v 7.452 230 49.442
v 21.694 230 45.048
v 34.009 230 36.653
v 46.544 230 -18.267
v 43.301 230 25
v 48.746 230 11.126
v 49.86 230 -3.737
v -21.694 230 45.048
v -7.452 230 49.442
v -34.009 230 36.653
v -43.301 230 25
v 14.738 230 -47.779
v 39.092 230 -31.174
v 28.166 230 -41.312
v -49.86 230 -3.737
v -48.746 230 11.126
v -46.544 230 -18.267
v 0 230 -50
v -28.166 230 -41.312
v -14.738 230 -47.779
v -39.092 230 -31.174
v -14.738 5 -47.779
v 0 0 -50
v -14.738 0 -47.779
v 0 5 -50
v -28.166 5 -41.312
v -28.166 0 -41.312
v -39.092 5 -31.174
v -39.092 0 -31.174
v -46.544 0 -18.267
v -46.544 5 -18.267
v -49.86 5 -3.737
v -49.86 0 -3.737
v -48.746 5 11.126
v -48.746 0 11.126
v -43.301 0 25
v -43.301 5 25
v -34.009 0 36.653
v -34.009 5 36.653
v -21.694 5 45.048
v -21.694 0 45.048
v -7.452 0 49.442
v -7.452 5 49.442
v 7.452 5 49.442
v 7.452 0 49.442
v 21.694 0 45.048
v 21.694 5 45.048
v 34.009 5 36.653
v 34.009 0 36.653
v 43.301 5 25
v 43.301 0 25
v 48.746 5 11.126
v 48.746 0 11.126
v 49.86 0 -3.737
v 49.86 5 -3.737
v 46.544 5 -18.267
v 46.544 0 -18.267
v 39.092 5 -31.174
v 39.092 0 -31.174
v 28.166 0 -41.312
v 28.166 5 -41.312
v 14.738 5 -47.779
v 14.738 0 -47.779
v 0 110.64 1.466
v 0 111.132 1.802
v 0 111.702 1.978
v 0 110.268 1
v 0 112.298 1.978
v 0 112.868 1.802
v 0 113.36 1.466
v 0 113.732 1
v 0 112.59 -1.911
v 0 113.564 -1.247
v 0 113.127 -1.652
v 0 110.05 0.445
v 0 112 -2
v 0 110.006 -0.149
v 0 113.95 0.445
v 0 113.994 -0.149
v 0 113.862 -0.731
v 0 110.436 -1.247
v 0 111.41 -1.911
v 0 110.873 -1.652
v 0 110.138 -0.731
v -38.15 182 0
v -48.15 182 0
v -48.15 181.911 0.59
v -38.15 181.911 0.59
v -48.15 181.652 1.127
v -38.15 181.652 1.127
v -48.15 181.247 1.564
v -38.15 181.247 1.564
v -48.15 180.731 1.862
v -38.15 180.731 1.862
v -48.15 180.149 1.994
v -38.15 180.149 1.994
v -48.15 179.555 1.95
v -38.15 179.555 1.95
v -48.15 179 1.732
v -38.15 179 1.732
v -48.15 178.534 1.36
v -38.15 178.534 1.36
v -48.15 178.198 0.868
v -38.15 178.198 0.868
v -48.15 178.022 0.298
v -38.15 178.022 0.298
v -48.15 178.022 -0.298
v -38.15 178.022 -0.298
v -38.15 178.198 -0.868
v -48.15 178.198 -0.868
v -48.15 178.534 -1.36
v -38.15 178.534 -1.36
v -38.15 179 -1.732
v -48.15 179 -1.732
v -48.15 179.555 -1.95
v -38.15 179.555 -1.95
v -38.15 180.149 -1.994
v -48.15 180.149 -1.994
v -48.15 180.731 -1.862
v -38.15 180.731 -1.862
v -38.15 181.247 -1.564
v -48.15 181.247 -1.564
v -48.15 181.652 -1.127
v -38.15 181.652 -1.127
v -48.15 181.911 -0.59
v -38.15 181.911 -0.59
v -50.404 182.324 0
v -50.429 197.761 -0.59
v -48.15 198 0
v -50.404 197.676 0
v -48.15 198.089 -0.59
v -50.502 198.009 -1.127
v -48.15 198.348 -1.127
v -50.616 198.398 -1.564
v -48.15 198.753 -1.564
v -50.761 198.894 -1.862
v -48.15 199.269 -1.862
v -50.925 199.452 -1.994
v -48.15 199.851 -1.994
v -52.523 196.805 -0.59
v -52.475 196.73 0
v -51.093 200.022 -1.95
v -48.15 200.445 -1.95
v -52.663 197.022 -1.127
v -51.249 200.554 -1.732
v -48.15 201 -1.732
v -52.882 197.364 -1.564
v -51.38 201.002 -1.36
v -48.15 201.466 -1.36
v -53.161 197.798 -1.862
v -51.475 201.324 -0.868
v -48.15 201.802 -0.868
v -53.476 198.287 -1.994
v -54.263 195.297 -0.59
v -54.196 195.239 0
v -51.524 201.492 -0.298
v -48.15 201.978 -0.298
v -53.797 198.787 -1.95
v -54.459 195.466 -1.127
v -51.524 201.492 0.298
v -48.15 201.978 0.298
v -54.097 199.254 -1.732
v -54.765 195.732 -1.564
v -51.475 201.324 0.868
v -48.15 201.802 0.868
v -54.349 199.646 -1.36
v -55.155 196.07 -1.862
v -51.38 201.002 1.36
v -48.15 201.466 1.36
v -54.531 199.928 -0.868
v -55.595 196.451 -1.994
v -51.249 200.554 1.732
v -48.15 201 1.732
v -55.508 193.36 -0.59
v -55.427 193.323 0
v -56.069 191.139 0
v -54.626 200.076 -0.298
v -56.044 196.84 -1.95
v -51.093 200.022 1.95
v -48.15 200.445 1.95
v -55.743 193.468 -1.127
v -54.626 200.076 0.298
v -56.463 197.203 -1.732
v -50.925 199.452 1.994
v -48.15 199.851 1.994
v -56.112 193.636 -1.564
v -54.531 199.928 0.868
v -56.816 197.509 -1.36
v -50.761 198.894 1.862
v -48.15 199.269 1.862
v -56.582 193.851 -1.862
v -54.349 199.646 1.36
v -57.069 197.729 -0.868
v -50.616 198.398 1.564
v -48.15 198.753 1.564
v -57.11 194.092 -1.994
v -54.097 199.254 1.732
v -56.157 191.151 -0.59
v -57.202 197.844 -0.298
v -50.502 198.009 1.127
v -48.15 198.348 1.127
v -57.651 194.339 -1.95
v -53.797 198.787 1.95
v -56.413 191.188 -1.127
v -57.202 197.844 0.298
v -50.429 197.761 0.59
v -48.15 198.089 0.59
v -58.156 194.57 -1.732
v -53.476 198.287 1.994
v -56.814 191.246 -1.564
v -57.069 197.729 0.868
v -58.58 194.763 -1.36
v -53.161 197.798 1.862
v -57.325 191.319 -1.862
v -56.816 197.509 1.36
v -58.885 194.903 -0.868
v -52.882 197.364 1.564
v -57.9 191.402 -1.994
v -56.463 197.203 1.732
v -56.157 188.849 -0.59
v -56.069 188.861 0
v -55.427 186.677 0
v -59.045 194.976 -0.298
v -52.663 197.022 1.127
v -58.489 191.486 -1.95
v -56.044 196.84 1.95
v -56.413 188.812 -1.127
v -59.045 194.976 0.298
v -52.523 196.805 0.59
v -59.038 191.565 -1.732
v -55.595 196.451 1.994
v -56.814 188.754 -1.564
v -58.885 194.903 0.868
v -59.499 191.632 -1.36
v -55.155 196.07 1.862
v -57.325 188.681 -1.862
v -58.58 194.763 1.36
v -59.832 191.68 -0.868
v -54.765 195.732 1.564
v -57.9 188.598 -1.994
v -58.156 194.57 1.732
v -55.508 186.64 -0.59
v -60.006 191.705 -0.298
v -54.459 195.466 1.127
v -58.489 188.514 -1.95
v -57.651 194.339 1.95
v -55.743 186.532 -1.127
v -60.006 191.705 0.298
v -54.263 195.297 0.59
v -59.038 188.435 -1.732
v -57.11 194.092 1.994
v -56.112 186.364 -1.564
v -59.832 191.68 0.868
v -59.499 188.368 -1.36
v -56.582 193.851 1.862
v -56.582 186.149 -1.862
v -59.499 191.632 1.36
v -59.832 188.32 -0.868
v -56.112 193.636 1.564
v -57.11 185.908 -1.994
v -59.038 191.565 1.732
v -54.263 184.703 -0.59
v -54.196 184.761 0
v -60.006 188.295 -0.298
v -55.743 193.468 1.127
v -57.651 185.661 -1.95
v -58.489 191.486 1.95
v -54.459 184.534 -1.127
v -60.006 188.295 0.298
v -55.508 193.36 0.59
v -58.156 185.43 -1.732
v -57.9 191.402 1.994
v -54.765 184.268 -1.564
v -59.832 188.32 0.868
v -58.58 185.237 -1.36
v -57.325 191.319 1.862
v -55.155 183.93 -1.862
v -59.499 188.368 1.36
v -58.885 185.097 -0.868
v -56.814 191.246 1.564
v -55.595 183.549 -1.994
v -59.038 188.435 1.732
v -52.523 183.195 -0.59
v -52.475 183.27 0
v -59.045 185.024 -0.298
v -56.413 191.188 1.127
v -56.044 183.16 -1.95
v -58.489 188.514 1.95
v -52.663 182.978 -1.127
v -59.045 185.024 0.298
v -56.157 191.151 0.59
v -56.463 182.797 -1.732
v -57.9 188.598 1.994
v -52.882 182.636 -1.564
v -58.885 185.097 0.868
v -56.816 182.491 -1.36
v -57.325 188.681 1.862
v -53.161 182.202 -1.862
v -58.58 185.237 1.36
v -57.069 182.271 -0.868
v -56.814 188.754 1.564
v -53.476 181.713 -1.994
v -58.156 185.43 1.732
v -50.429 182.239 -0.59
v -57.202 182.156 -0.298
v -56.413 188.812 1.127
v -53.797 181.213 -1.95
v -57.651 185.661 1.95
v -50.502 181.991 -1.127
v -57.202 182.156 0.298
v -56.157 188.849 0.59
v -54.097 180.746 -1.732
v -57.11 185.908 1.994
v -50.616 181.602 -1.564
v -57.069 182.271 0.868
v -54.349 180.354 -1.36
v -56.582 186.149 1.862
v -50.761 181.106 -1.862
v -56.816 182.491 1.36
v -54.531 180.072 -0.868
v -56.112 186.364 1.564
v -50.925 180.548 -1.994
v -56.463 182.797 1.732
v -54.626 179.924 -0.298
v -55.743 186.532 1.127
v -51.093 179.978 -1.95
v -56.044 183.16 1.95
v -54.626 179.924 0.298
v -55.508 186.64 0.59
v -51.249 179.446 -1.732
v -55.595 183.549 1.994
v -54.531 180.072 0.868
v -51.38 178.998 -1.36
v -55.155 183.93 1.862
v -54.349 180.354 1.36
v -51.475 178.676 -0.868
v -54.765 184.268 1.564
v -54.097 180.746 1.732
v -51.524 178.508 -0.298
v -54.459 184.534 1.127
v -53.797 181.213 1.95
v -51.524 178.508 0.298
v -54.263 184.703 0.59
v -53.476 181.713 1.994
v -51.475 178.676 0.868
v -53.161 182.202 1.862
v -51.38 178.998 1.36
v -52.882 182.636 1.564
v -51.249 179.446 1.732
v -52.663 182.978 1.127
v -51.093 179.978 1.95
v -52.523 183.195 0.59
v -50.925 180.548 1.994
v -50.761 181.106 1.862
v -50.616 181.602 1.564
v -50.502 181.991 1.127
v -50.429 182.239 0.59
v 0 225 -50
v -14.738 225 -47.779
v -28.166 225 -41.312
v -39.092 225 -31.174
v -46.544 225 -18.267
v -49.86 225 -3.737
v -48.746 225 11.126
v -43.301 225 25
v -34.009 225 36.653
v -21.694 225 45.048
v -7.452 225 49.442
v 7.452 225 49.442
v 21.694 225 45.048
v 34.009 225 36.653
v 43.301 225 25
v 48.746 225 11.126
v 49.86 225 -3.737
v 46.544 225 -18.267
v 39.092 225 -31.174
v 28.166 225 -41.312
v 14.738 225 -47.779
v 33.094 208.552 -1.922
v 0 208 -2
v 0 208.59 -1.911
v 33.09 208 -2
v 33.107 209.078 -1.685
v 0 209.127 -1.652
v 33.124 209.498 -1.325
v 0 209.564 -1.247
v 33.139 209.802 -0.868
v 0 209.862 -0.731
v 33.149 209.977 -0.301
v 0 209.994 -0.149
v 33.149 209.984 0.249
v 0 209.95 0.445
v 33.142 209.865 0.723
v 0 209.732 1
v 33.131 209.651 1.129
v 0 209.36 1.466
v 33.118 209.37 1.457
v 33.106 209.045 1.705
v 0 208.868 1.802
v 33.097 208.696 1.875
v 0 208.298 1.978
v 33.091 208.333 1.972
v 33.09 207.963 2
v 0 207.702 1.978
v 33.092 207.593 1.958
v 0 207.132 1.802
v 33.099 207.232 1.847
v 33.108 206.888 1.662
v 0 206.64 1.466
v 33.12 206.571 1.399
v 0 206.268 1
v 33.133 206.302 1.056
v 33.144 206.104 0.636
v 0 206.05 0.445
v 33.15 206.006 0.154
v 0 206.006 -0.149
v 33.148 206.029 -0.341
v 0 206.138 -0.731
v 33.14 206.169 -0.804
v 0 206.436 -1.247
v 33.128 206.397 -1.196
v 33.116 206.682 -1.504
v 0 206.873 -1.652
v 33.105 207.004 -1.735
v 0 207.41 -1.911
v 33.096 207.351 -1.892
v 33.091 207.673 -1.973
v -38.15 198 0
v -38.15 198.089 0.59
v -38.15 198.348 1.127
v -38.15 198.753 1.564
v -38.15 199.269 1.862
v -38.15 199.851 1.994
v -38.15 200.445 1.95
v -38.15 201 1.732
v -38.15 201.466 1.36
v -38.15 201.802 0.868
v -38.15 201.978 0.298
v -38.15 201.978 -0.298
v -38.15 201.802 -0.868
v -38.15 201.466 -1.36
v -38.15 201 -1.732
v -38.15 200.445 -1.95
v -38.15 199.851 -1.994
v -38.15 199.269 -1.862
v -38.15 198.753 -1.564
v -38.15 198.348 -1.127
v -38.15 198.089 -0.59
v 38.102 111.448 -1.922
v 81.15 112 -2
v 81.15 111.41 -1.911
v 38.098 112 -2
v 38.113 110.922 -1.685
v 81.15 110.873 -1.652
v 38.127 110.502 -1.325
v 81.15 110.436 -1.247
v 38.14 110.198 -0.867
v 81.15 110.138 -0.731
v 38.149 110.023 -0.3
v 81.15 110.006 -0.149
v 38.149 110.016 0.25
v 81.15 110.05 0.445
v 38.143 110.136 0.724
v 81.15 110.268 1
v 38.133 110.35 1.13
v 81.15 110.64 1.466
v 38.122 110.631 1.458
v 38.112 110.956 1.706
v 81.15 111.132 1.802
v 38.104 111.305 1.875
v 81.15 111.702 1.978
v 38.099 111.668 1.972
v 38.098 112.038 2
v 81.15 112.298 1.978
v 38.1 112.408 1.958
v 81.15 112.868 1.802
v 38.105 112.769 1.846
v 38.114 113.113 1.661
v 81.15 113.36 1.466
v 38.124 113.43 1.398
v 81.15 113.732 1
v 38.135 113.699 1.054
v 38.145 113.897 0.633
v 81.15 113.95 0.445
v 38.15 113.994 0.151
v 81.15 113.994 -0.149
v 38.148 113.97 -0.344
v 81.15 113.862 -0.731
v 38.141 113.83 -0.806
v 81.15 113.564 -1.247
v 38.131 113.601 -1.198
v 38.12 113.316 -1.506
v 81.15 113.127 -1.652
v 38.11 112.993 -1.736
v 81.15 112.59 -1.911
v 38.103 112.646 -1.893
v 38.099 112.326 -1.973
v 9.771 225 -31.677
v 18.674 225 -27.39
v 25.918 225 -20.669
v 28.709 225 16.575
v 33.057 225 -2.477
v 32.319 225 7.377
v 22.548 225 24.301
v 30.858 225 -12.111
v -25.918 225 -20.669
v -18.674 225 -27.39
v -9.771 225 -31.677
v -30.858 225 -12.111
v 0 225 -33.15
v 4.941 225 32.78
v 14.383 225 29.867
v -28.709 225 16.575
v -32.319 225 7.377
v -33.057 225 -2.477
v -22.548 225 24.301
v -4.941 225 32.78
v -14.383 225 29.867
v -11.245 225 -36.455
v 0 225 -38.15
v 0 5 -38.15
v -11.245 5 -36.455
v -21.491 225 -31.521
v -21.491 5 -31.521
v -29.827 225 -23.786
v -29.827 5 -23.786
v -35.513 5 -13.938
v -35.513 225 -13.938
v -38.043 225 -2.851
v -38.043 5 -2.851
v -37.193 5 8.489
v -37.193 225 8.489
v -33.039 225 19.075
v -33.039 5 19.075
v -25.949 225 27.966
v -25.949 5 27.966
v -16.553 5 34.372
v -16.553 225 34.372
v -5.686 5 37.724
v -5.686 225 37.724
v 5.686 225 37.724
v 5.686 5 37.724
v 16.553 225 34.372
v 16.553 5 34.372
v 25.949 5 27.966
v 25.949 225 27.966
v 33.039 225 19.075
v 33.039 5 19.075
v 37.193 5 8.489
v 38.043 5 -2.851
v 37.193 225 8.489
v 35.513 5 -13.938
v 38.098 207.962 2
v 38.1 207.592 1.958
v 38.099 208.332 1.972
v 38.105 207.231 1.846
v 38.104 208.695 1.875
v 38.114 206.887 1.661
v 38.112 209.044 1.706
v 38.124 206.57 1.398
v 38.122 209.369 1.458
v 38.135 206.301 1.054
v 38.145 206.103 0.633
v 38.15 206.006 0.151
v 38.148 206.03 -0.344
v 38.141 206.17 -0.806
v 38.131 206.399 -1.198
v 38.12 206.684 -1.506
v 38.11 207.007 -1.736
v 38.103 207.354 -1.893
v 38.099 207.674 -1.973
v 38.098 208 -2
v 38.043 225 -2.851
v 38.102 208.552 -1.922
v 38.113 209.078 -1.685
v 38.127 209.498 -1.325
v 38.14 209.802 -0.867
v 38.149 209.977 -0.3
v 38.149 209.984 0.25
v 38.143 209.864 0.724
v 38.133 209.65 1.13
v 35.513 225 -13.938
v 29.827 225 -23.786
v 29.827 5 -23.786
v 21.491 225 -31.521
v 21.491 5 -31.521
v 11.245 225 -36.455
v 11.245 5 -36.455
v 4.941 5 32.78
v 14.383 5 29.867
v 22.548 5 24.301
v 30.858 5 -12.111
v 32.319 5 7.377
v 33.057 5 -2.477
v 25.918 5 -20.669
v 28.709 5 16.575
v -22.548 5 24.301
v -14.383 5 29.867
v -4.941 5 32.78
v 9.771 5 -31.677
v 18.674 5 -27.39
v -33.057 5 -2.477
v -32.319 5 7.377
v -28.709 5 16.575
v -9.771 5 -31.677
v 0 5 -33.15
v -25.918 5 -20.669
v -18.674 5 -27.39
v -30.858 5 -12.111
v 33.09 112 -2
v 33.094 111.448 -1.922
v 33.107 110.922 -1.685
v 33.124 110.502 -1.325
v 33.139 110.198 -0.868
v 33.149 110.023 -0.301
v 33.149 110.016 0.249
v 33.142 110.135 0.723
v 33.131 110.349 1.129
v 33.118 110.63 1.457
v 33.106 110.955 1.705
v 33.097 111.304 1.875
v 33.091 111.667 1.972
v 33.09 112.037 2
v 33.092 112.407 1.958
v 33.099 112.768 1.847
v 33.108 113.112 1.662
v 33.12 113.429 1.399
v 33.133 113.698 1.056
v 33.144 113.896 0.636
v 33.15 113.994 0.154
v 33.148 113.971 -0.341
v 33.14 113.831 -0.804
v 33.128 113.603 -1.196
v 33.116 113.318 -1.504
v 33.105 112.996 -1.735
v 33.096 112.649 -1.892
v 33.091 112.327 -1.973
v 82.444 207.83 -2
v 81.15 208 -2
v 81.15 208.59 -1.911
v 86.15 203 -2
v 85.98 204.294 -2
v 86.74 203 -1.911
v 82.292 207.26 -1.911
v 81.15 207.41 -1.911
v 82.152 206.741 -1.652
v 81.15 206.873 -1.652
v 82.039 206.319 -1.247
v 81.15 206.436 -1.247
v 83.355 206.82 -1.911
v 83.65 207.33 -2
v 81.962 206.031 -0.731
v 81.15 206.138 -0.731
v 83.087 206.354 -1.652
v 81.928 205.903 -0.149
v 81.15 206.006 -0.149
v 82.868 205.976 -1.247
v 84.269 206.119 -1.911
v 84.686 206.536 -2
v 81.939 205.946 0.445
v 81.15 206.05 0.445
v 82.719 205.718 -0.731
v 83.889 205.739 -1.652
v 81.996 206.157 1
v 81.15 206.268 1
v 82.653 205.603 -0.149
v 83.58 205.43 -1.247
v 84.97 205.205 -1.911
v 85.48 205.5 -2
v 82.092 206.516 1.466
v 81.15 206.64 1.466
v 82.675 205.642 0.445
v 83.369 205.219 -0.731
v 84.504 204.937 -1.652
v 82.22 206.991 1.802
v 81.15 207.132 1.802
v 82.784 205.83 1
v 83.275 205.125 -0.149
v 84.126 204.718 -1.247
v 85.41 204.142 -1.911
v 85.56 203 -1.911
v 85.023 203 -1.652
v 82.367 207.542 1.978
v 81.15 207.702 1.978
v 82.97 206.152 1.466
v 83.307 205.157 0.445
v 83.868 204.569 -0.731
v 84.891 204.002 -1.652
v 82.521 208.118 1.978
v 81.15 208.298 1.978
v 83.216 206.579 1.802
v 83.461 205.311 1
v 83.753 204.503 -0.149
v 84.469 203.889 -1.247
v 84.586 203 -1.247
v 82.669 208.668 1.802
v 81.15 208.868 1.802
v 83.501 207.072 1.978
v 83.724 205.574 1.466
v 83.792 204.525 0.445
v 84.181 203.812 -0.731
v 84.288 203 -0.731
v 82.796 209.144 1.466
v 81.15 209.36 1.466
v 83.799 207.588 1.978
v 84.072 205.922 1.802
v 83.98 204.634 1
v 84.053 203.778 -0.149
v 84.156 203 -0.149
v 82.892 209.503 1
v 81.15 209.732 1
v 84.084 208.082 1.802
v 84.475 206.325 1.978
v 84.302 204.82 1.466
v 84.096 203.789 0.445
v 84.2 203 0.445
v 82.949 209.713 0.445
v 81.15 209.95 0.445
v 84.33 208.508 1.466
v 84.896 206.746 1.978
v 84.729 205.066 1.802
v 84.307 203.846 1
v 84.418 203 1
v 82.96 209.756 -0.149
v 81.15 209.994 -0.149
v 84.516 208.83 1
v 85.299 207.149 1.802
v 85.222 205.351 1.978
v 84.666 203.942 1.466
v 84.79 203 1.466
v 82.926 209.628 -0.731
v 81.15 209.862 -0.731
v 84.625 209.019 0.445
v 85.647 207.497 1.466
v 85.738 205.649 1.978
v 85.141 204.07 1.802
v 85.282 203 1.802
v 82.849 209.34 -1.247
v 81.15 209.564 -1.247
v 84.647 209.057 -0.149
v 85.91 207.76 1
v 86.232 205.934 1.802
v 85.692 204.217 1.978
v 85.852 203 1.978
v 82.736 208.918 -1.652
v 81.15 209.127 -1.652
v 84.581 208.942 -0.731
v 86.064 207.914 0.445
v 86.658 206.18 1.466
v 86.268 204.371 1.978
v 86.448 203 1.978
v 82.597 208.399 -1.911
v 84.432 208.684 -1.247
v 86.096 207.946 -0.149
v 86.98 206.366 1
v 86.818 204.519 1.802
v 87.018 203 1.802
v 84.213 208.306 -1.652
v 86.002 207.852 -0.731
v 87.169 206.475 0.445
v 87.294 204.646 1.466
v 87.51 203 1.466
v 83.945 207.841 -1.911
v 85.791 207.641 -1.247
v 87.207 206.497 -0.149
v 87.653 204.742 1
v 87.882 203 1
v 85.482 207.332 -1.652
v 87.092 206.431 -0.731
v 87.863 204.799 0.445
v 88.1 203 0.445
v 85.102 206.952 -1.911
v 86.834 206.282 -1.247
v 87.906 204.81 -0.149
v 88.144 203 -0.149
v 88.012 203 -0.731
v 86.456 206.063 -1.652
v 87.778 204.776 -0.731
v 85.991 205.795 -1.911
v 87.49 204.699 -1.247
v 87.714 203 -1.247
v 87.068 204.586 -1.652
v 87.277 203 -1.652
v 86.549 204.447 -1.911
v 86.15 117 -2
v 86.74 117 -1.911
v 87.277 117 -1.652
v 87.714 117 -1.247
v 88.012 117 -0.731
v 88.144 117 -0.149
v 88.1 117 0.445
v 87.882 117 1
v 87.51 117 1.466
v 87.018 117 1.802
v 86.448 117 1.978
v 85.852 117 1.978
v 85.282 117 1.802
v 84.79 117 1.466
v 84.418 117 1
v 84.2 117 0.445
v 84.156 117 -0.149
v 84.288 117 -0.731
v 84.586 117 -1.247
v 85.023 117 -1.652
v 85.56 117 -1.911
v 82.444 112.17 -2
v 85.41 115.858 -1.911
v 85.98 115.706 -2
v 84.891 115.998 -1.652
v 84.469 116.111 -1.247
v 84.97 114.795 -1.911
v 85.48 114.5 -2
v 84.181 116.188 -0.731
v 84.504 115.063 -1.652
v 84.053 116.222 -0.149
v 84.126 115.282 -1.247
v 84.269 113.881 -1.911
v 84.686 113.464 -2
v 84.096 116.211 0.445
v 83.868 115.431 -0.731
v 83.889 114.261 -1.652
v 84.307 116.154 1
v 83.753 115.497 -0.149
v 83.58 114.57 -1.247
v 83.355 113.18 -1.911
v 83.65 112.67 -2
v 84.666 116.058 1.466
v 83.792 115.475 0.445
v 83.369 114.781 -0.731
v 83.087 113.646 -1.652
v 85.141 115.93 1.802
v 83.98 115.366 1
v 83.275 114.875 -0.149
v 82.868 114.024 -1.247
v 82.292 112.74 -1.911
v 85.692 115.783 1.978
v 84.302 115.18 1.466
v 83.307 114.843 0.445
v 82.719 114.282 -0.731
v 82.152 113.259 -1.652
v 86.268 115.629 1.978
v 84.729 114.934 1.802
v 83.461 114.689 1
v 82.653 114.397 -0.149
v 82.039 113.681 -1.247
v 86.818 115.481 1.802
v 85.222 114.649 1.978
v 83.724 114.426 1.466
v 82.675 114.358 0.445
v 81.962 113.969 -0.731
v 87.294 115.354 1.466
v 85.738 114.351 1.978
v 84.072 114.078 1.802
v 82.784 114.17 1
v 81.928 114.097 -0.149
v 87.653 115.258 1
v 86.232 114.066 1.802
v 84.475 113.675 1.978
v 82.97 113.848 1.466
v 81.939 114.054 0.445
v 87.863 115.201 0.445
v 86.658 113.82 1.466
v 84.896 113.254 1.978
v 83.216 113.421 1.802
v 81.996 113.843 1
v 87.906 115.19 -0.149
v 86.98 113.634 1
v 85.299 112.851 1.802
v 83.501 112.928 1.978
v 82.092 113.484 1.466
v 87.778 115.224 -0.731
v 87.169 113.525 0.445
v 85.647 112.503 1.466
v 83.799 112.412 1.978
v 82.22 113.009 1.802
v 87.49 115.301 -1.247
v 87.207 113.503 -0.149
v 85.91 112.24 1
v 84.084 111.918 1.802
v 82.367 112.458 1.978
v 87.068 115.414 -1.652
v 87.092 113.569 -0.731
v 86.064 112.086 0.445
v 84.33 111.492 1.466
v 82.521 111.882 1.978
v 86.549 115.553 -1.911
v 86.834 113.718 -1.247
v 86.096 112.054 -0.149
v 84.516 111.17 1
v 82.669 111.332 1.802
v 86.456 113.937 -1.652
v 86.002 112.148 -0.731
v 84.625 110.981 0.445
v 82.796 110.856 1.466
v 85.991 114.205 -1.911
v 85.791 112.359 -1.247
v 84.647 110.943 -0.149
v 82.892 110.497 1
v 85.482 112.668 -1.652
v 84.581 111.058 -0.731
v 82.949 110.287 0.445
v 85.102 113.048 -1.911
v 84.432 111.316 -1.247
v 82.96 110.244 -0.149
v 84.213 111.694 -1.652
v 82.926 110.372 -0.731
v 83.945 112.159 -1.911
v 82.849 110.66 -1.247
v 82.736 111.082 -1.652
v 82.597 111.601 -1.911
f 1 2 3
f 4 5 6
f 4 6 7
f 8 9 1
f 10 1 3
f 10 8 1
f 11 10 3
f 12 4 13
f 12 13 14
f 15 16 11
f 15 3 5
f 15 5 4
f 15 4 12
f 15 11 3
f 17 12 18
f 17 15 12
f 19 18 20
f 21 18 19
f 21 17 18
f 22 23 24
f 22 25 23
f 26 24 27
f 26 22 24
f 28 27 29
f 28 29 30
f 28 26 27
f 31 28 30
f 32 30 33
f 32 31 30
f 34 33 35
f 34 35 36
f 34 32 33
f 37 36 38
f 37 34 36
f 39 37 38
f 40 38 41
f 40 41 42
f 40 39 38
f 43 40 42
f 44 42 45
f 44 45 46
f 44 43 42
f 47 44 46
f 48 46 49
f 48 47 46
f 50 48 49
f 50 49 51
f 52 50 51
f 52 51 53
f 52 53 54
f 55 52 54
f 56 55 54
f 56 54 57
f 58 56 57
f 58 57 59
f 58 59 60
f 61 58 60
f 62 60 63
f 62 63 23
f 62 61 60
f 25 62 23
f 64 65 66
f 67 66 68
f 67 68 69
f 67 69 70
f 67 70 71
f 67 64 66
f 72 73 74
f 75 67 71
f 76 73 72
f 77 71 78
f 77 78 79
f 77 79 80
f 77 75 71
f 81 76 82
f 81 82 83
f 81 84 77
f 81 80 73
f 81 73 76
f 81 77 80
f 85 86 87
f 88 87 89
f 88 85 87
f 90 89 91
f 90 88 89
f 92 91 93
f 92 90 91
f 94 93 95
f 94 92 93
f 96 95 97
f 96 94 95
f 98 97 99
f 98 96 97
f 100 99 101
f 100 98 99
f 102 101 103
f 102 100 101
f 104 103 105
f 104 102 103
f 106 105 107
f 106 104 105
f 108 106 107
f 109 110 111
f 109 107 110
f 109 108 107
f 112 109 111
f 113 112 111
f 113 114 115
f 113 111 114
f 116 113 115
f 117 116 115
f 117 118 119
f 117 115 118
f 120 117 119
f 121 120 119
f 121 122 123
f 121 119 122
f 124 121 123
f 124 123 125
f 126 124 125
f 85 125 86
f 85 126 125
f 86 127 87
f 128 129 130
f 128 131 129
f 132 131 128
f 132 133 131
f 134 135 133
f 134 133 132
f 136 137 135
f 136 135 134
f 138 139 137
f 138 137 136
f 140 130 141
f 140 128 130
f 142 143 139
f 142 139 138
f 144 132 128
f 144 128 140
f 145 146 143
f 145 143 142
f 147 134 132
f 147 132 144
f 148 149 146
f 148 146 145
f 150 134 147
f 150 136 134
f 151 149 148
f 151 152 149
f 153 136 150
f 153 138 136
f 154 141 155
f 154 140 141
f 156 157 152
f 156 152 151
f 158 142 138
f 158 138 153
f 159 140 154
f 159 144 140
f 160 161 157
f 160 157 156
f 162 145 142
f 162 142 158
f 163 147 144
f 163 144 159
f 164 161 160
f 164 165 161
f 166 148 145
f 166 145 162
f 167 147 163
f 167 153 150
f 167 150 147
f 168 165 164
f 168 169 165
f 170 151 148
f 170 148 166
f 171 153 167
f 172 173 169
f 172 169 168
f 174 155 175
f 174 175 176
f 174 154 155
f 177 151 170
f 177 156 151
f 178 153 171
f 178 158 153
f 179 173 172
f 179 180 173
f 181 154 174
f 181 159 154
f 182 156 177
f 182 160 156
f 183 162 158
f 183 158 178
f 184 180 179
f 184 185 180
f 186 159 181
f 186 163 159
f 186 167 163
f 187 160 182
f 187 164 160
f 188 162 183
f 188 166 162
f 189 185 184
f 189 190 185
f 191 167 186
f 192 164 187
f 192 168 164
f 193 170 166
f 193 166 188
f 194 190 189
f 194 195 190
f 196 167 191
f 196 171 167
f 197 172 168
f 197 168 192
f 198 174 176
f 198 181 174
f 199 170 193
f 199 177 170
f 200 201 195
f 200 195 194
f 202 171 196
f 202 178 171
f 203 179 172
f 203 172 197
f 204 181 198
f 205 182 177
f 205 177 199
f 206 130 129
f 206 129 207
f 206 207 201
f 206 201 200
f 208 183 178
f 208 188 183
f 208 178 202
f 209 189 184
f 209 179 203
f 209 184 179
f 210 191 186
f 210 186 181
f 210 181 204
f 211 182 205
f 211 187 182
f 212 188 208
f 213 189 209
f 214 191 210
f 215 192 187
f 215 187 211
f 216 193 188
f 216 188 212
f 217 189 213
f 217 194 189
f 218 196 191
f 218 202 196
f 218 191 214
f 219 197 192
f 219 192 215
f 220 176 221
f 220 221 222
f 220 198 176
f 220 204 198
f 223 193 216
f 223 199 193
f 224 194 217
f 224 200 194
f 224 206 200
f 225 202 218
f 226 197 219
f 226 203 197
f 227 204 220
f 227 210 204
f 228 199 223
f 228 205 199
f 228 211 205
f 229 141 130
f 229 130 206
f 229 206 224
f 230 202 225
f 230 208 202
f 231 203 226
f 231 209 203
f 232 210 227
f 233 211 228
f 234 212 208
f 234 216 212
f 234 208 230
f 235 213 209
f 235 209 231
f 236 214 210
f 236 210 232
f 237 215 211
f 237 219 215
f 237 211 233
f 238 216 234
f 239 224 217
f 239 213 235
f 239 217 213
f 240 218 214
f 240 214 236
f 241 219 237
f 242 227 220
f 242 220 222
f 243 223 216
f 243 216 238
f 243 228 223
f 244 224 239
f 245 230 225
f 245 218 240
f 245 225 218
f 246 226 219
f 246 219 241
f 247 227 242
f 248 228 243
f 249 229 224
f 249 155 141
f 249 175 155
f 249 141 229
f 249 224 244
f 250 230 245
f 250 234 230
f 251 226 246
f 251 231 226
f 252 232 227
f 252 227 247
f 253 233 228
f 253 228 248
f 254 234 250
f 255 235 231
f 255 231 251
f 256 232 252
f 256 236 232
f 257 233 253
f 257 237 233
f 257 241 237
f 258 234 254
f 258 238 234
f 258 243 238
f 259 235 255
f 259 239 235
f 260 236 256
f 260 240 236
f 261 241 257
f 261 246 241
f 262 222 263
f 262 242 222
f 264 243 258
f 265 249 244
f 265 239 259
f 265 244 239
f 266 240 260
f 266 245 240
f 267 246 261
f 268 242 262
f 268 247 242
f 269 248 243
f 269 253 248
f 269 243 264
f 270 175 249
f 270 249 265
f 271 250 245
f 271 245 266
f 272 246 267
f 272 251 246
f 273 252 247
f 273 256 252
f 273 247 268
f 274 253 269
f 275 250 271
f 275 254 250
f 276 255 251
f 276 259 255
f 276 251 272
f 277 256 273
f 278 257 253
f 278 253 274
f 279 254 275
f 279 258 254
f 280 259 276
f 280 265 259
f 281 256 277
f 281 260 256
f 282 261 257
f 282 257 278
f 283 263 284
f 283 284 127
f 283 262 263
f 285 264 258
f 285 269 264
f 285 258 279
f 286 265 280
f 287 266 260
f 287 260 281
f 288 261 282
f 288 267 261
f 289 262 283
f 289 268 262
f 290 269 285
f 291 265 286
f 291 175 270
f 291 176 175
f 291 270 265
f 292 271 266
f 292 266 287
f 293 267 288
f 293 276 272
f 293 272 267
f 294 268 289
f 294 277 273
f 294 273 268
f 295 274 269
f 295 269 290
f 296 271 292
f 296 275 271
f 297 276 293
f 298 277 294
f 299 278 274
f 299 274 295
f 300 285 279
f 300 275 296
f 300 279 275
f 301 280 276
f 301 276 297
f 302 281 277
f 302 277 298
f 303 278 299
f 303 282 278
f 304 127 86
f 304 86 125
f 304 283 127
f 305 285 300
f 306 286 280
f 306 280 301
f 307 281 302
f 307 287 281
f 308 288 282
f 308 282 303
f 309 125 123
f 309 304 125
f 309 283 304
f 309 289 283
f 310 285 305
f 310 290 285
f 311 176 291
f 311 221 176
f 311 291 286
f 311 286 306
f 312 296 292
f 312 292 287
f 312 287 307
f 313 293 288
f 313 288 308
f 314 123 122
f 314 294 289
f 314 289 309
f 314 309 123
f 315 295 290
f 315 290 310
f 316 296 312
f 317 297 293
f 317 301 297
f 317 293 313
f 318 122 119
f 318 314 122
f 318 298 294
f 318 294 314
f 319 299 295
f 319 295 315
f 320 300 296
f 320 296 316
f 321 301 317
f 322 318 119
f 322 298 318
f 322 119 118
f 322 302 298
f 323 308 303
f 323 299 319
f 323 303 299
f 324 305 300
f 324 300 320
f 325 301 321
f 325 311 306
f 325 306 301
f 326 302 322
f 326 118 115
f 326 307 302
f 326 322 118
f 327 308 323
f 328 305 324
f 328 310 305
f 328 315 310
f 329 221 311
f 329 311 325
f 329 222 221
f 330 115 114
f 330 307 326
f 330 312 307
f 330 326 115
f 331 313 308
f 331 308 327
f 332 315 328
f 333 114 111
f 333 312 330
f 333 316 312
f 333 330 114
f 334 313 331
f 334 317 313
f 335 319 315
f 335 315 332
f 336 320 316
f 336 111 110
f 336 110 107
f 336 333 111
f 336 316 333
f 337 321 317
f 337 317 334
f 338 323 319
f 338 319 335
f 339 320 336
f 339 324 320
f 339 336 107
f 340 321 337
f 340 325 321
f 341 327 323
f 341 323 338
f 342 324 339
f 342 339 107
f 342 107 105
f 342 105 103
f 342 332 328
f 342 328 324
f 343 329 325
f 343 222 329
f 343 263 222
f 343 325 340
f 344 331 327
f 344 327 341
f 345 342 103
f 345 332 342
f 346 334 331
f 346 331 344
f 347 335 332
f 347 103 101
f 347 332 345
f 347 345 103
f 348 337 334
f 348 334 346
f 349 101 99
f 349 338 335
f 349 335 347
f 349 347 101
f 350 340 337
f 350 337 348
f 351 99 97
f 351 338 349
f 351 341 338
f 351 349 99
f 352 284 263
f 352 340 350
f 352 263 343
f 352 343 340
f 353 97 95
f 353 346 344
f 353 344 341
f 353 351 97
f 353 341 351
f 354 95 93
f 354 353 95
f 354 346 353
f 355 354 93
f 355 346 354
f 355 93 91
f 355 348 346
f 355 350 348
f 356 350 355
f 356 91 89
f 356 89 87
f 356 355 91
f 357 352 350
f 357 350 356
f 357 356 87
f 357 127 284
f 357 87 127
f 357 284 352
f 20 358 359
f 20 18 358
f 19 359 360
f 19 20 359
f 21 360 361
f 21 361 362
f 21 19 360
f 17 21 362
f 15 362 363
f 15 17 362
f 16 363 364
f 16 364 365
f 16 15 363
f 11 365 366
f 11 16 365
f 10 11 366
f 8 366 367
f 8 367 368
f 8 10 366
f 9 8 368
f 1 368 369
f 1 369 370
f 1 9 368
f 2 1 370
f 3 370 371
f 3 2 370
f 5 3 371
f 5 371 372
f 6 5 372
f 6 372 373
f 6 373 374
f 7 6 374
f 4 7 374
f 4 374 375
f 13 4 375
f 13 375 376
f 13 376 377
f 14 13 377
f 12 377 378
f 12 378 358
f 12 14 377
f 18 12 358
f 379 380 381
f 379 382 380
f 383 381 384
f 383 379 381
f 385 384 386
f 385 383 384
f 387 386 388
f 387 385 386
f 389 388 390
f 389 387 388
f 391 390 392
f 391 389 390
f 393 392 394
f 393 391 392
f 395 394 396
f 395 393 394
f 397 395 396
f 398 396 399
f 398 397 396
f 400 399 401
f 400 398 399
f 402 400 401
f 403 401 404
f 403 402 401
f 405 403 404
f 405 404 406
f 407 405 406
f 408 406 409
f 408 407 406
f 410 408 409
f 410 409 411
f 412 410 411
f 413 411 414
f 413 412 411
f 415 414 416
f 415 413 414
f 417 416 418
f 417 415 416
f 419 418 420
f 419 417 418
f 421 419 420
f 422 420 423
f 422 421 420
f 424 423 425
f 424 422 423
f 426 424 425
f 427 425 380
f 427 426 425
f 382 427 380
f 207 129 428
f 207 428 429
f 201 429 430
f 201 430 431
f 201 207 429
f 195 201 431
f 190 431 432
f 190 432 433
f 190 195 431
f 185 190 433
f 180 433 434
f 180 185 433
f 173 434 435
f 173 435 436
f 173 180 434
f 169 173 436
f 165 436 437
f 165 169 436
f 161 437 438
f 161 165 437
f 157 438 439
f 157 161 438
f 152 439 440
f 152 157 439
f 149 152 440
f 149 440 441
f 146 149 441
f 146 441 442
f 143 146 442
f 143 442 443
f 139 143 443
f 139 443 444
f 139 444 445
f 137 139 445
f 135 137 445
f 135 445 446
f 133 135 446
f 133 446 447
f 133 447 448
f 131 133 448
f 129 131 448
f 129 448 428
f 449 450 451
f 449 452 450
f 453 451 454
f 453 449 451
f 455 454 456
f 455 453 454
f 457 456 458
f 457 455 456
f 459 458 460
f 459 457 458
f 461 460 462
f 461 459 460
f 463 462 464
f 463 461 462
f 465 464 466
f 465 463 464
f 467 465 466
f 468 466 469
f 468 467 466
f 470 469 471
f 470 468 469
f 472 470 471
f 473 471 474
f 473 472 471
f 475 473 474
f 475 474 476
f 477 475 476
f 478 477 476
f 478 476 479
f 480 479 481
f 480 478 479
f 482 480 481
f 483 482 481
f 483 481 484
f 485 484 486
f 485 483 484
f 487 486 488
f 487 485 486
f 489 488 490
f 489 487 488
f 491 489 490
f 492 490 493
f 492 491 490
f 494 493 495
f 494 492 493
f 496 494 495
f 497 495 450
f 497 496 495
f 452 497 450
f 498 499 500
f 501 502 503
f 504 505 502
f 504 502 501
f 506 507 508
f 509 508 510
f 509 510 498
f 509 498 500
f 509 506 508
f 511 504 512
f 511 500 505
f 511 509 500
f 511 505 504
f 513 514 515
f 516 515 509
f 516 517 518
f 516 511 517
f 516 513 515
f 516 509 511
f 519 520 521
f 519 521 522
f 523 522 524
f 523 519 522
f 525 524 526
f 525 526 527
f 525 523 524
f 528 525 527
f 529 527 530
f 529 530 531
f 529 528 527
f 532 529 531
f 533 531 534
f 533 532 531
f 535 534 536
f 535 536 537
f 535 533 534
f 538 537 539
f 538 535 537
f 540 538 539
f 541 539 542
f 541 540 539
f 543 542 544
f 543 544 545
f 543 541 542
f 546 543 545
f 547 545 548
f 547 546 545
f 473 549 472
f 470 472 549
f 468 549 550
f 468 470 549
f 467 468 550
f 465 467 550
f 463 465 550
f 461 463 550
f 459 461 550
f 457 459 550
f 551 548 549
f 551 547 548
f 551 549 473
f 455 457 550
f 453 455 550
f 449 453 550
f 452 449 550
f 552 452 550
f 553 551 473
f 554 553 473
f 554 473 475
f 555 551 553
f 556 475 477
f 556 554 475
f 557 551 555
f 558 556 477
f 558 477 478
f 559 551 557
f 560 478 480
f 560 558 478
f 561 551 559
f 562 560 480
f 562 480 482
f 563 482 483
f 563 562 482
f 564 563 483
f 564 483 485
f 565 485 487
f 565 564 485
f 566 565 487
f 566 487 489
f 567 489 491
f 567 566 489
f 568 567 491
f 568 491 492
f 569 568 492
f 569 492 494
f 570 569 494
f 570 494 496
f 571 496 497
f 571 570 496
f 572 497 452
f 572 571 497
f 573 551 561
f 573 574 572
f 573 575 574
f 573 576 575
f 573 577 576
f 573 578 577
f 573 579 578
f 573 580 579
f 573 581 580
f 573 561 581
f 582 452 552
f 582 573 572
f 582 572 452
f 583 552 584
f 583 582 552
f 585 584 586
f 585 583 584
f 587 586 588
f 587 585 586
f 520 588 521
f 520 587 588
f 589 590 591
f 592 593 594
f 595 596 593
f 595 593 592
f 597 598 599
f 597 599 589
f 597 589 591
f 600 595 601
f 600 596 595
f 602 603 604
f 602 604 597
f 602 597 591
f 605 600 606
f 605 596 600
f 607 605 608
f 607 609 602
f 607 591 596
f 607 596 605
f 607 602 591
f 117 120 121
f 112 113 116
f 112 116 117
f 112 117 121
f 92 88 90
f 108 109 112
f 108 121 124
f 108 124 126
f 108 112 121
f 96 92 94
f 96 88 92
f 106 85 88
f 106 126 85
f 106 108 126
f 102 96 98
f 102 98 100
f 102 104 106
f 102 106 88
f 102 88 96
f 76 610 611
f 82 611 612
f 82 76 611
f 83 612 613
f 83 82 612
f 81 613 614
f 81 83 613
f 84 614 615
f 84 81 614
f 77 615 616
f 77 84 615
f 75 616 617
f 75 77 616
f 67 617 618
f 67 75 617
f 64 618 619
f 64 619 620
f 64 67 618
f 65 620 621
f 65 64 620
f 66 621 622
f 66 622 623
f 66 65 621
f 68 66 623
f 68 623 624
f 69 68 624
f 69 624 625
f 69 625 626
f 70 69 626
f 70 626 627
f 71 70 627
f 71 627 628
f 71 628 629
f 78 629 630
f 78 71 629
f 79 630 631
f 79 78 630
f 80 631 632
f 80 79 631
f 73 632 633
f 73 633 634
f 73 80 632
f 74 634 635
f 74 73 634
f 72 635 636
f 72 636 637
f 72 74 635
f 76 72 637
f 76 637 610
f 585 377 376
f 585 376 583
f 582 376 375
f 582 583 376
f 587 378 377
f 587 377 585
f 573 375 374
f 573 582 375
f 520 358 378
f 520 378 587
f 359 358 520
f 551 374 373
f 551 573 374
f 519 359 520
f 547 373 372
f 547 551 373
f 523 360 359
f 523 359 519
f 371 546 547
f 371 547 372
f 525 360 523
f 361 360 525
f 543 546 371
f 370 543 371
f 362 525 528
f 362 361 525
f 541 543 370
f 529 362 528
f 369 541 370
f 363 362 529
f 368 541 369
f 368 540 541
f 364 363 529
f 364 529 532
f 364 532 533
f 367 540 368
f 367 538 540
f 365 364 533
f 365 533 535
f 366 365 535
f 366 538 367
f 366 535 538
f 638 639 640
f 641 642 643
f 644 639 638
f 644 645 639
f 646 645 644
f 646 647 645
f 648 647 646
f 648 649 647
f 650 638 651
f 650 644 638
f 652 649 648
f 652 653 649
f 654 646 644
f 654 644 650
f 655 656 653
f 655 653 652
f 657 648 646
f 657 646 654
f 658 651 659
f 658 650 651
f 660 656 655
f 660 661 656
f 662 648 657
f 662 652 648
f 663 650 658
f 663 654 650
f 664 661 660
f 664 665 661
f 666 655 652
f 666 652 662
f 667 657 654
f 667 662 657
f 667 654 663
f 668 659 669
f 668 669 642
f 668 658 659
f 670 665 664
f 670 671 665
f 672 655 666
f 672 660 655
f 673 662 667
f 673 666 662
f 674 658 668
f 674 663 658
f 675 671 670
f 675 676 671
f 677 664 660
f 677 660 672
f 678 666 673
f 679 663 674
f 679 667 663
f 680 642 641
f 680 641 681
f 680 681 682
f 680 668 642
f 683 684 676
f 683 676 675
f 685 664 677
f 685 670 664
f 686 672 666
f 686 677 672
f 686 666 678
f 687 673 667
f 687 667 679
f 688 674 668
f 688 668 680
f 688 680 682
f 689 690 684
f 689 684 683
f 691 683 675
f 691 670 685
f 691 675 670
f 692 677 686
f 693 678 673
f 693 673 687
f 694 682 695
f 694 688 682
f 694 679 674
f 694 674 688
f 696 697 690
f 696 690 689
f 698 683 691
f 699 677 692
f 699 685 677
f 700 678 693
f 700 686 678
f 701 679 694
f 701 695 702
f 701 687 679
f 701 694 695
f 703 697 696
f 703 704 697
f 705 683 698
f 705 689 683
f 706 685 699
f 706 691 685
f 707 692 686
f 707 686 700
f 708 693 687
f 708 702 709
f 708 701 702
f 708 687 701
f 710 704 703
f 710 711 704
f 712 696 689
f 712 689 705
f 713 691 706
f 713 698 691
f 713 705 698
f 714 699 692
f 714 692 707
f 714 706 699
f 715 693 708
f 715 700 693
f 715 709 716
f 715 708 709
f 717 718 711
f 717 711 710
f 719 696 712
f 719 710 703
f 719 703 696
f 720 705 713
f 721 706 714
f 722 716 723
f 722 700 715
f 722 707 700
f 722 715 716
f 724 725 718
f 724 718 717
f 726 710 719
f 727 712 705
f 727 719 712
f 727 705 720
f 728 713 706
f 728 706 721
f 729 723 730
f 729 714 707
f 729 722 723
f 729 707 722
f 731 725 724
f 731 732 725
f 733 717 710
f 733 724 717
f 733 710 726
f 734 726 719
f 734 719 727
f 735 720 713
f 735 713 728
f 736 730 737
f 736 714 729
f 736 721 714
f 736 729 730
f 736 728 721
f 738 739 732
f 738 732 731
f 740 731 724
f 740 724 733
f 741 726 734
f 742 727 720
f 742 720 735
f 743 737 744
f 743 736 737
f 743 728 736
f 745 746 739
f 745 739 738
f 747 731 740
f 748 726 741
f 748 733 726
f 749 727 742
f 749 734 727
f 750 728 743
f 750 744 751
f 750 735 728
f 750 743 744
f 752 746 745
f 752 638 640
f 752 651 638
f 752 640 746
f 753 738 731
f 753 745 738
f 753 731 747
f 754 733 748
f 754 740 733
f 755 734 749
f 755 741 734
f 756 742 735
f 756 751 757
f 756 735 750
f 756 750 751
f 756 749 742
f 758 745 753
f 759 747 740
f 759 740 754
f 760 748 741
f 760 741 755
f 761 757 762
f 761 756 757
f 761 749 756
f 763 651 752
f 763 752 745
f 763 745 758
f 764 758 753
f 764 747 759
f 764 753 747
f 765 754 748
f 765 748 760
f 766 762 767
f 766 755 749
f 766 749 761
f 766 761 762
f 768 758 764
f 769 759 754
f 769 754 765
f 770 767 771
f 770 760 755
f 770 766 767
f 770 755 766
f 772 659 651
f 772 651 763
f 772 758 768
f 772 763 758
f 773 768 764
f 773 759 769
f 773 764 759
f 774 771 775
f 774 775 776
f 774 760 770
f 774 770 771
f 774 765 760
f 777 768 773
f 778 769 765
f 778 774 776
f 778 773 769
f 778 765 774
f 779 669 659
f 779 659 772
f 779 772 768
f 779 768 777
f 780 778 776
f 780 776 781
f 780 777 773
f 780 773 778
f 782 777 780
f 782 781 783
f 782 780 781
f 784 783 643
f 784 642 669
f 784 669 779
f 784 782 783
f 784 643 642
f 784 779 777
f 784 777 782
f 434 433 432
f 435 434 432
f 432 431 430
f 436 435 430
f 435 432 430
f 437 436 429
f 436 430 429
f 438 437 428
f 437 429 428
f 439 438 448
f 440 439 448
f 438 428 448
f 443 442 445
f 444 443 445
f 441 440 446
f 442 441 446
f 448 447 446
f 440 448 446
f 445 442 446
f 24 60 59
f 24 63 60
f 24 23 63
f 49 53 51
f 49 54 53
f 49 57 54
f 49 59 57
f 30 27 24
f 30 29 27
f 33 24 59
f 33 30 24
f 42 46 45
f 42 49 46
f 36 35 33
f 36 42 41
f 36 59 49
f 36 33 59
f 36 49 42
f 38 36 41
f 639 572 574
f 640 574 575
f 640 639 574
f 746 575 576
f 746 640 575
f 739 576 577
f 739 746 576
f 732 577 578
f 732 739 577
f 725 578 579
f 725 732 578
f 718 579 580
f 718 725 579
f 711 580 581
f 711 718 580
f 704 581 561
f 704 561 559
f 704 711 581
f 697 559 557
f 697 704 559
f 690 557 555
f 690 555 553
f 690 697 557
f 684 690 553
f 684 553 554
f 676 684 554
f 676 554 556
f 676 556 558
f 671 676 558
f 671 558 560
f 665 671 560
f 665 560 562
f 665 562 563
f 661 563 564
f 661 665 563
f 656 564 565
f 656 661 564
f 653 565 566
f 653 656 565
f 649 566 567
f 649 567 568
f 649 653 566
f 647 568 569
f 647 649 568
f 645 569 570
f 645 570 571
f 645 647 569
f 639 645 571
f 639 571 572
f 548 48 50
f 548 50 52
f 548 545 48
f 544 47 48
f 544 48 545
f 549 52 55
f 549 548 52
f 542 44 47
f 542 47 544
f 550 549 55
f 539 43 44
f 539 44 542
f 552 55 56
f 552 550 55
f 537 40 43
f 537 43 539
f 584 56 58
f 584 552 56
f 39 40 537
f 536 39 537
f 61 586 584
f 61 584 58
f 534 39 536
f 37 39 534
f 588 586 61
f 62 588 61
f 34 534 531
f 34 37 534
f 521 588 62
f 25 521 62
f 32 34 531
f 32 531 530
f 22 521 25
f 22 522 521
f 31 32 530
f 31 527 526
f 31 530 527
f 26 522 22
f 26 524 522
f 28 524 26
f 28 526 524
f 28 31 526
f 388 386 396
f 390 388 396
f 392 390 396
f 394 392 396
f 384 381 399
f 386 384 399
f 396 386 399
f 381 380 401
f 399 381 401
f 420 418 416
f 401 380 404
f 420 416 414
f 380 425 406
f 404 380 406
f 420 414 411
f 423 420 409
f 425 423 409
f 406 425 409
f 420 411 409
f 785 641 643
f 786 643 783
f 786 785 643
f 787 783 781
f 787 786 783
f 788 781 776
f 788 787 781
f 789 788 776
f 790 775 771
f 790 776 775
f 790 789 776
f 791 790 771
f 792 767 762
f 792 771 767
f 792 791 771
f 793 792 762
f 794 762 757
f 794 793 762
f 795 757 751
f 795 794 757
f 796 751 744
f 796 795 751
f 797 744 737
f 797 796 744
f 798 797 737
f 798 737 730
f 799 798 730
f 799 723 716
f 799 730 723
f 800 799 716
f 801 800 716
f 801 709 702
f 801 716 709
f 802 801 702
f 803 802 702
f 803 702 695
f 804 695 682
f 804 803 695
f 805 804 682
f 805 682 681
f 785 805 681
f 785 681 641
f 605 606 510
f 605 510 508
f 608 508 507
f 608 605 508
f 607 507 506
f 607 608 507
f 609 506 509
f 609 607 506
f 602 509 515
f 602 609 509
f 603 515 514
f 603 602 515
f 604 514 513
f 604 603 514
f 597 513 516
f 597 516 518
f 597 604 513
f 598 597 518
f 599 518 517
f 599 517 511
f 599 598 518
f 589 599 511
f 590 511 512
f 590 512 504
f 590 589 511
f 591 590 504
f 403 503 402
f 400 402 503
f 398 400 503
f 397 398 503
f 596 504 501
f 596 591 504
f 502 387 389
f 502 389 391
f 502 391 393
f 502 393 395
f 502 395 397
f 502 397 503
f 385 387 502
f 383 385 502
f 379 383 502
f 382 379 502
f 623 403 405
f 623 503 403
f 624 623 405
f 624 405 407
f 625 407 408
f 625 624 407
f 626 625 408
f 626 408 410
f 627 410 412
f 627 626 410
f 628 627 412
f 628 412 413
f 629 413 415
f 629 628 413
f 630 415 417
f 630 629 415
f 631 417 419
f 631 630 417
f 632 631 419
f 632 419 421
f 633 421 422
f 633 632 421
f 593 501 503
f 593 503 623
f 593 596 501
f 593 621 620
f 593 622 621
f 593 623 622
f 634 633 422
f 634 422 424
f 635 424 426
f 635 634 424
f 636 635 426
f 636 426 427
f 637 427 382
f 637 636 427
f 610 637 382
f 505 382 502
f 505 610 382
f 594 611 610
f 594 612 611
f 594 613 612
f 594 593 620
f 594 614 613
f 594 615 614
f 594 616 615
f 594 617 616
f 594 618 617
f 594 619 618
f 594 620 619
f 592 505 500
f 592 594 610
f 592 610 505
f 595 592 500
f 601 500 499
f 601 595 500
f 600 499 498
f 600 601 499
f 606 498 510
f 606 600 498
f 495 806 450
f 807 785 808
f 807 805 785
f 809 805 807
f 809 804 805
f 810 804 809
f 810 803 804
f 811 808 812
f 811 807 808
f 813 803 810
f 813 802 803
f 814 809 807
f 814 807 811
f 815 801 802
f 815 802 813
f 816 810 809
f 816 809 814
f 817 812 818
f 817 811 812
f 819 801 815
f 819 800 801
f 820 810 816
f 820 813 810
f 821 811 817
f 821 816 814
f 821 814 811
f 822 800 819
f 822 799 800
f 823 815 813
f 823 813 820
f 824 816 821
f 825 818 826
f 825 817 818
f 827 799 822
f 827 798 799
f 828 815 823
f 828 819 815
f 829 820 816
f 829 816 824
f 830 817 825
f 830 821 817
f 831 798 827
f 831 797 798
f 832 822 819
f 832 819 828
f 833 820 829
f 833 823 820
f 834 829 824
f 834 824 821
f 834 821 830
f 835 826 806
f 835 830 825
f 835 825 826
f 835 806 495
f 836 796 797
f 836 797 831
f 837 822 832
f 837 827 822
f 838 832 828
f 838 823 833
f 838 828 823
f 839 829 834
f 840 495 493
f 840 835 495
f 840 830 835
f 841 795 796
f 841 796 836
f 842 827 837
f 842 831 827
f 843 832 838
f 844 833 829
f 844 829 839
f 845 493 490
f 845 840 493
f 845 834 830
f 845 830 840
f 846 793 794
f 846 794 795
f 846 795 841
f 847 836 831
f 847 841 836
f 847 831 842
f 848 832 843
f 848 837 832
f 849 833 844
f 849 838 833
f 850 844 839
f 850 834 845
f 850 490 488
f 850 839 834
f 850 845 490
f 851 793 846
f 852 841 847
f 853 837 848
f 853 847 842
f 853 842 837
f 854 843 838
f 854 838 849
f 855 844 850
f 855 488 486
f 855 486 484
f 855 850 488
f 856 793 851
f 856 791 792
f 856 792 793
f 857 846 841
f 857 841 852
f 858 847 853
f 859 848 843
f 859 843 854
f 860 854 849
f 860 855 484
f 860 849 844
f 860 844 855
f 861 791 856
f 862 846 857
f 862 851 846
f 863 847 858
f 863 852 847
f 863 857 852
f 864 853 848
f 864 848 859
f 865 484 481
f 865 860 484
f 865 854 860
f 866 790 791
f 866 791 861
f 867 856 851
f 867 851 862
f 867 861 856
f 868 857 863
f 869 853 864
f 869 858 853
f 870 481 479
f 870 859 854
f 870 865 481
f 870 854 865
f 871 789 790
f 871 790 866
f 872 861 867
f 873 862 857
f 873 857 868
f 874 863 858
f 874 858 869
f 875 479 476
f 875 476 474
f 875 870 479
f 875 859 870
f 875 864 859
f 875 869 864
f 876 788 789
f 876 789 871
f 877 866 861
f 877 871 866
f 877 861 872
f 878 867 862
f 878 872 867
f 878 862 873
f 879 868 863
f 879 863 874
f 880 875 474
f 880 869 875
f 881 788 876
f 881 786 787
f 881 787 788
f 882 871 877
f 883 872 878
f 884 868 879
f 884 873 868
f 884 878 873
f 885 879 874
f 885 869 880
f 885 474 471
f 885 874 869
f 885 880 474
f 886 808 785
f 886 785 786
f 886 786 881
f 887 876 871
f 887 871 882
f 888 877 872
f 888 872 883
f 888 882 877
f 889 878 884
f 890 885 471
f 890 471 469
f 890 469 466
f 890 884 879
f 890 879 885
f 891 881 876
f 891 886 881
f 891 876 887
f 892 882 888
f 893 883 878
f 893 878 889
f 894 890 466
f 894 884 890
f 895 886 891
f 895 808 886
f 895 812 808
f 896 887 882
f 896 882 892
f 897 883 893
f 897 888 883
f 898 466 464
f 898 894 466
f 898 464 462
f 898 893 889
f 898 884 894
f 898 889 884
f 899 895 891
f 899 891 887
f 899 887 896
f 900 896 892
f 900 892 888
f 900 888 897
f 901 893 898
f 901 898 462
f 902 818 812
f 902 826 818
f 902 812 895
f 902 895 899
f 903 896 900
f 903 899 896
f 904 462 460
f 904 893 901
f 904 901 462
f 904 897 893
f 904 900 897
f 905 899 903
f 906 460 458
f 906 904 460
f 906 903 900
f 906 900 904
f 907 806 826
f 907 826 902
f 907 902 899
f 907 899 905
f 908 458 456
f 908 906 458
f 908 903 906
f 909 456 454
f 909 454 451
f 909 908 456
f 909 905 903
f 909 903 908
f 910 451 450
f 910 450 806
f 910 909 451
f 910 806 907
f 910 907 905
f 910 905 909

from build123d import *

# Parameters (mm, degrees)
SKETCH_3_R        = 2
SWEEP_2_PROFILE_R = 2


with BuildPart() as part:
    # 草圖1 → 旋轉1 (revolve)
    with BuildSketch(Plane.XY, mode=Mode.PRIVATE) as revolve_1_sk:
        Polygon((0, 5), (0, 0), (50, 0), (50, 5), (38.15, 5), (38.15, 225), (50, 225), (50, 230), (0, 230), (0, 225), (33.15, 225), (33.15, 5), align=None)
    revolve(revolve_1_sk.sketch.rotate(Axis((0, 0, 0), (0, 1, 0)), 90), axis=Axis((0, 0, 0), (0, 1, 0)))

    # 掃出1: sweep along a path in 草圖2
    with BuildLine(Plane.XY) as sweep_1_path:
        Line((0, 208), (81.15, 208))
        ThreePointArc((81.15, 208), (84.685533906, 206.535533906), (86.15, 203))
        Line((86.15, 203), (86.15, 117))
        ThreePointArc((86.15, 117), (84.685533906, 113.464466094), (81.15, 112))
        Line((81.15, 112), (0, 112))
    # 草圖3 → 掃出1 (sweep)
    with BuildSketch(Plane(origin=(0, 0, 0), x_dir=(0, 0, -1), z_dir=(1, 0, 0))):
        with Locations((0, 208)):
            Circle(SKETCH_3_R)
    sweep(path=sweep_1_path.line)


with BuildPart() as body_2:
    # 掃出2: sweep along a path in 草圖4
    with BuildLine(Plane.XY) as sweep_2_path:
        Line((-38.15, 200), (-48.15, 200))
        ThreePointArc((-48.15, 200), (-58.15, 190), (-48.15, 180))
        Line((-48.15, 180), (-38.15, 180))
    # 掃出2 profile (on start of the path) → 掃出2 (sweep)
    with BuildSketch(Plane(origin=(-38.15, 200, 0), x_dir=(0, -1, 0), z_dir=(-1, 0, 0))):
        Circle(SWEEP_2_PROFILE_R)
    sweep(path=sweep_2_path.line)


solid = Compound([part.part, body_2.part])
